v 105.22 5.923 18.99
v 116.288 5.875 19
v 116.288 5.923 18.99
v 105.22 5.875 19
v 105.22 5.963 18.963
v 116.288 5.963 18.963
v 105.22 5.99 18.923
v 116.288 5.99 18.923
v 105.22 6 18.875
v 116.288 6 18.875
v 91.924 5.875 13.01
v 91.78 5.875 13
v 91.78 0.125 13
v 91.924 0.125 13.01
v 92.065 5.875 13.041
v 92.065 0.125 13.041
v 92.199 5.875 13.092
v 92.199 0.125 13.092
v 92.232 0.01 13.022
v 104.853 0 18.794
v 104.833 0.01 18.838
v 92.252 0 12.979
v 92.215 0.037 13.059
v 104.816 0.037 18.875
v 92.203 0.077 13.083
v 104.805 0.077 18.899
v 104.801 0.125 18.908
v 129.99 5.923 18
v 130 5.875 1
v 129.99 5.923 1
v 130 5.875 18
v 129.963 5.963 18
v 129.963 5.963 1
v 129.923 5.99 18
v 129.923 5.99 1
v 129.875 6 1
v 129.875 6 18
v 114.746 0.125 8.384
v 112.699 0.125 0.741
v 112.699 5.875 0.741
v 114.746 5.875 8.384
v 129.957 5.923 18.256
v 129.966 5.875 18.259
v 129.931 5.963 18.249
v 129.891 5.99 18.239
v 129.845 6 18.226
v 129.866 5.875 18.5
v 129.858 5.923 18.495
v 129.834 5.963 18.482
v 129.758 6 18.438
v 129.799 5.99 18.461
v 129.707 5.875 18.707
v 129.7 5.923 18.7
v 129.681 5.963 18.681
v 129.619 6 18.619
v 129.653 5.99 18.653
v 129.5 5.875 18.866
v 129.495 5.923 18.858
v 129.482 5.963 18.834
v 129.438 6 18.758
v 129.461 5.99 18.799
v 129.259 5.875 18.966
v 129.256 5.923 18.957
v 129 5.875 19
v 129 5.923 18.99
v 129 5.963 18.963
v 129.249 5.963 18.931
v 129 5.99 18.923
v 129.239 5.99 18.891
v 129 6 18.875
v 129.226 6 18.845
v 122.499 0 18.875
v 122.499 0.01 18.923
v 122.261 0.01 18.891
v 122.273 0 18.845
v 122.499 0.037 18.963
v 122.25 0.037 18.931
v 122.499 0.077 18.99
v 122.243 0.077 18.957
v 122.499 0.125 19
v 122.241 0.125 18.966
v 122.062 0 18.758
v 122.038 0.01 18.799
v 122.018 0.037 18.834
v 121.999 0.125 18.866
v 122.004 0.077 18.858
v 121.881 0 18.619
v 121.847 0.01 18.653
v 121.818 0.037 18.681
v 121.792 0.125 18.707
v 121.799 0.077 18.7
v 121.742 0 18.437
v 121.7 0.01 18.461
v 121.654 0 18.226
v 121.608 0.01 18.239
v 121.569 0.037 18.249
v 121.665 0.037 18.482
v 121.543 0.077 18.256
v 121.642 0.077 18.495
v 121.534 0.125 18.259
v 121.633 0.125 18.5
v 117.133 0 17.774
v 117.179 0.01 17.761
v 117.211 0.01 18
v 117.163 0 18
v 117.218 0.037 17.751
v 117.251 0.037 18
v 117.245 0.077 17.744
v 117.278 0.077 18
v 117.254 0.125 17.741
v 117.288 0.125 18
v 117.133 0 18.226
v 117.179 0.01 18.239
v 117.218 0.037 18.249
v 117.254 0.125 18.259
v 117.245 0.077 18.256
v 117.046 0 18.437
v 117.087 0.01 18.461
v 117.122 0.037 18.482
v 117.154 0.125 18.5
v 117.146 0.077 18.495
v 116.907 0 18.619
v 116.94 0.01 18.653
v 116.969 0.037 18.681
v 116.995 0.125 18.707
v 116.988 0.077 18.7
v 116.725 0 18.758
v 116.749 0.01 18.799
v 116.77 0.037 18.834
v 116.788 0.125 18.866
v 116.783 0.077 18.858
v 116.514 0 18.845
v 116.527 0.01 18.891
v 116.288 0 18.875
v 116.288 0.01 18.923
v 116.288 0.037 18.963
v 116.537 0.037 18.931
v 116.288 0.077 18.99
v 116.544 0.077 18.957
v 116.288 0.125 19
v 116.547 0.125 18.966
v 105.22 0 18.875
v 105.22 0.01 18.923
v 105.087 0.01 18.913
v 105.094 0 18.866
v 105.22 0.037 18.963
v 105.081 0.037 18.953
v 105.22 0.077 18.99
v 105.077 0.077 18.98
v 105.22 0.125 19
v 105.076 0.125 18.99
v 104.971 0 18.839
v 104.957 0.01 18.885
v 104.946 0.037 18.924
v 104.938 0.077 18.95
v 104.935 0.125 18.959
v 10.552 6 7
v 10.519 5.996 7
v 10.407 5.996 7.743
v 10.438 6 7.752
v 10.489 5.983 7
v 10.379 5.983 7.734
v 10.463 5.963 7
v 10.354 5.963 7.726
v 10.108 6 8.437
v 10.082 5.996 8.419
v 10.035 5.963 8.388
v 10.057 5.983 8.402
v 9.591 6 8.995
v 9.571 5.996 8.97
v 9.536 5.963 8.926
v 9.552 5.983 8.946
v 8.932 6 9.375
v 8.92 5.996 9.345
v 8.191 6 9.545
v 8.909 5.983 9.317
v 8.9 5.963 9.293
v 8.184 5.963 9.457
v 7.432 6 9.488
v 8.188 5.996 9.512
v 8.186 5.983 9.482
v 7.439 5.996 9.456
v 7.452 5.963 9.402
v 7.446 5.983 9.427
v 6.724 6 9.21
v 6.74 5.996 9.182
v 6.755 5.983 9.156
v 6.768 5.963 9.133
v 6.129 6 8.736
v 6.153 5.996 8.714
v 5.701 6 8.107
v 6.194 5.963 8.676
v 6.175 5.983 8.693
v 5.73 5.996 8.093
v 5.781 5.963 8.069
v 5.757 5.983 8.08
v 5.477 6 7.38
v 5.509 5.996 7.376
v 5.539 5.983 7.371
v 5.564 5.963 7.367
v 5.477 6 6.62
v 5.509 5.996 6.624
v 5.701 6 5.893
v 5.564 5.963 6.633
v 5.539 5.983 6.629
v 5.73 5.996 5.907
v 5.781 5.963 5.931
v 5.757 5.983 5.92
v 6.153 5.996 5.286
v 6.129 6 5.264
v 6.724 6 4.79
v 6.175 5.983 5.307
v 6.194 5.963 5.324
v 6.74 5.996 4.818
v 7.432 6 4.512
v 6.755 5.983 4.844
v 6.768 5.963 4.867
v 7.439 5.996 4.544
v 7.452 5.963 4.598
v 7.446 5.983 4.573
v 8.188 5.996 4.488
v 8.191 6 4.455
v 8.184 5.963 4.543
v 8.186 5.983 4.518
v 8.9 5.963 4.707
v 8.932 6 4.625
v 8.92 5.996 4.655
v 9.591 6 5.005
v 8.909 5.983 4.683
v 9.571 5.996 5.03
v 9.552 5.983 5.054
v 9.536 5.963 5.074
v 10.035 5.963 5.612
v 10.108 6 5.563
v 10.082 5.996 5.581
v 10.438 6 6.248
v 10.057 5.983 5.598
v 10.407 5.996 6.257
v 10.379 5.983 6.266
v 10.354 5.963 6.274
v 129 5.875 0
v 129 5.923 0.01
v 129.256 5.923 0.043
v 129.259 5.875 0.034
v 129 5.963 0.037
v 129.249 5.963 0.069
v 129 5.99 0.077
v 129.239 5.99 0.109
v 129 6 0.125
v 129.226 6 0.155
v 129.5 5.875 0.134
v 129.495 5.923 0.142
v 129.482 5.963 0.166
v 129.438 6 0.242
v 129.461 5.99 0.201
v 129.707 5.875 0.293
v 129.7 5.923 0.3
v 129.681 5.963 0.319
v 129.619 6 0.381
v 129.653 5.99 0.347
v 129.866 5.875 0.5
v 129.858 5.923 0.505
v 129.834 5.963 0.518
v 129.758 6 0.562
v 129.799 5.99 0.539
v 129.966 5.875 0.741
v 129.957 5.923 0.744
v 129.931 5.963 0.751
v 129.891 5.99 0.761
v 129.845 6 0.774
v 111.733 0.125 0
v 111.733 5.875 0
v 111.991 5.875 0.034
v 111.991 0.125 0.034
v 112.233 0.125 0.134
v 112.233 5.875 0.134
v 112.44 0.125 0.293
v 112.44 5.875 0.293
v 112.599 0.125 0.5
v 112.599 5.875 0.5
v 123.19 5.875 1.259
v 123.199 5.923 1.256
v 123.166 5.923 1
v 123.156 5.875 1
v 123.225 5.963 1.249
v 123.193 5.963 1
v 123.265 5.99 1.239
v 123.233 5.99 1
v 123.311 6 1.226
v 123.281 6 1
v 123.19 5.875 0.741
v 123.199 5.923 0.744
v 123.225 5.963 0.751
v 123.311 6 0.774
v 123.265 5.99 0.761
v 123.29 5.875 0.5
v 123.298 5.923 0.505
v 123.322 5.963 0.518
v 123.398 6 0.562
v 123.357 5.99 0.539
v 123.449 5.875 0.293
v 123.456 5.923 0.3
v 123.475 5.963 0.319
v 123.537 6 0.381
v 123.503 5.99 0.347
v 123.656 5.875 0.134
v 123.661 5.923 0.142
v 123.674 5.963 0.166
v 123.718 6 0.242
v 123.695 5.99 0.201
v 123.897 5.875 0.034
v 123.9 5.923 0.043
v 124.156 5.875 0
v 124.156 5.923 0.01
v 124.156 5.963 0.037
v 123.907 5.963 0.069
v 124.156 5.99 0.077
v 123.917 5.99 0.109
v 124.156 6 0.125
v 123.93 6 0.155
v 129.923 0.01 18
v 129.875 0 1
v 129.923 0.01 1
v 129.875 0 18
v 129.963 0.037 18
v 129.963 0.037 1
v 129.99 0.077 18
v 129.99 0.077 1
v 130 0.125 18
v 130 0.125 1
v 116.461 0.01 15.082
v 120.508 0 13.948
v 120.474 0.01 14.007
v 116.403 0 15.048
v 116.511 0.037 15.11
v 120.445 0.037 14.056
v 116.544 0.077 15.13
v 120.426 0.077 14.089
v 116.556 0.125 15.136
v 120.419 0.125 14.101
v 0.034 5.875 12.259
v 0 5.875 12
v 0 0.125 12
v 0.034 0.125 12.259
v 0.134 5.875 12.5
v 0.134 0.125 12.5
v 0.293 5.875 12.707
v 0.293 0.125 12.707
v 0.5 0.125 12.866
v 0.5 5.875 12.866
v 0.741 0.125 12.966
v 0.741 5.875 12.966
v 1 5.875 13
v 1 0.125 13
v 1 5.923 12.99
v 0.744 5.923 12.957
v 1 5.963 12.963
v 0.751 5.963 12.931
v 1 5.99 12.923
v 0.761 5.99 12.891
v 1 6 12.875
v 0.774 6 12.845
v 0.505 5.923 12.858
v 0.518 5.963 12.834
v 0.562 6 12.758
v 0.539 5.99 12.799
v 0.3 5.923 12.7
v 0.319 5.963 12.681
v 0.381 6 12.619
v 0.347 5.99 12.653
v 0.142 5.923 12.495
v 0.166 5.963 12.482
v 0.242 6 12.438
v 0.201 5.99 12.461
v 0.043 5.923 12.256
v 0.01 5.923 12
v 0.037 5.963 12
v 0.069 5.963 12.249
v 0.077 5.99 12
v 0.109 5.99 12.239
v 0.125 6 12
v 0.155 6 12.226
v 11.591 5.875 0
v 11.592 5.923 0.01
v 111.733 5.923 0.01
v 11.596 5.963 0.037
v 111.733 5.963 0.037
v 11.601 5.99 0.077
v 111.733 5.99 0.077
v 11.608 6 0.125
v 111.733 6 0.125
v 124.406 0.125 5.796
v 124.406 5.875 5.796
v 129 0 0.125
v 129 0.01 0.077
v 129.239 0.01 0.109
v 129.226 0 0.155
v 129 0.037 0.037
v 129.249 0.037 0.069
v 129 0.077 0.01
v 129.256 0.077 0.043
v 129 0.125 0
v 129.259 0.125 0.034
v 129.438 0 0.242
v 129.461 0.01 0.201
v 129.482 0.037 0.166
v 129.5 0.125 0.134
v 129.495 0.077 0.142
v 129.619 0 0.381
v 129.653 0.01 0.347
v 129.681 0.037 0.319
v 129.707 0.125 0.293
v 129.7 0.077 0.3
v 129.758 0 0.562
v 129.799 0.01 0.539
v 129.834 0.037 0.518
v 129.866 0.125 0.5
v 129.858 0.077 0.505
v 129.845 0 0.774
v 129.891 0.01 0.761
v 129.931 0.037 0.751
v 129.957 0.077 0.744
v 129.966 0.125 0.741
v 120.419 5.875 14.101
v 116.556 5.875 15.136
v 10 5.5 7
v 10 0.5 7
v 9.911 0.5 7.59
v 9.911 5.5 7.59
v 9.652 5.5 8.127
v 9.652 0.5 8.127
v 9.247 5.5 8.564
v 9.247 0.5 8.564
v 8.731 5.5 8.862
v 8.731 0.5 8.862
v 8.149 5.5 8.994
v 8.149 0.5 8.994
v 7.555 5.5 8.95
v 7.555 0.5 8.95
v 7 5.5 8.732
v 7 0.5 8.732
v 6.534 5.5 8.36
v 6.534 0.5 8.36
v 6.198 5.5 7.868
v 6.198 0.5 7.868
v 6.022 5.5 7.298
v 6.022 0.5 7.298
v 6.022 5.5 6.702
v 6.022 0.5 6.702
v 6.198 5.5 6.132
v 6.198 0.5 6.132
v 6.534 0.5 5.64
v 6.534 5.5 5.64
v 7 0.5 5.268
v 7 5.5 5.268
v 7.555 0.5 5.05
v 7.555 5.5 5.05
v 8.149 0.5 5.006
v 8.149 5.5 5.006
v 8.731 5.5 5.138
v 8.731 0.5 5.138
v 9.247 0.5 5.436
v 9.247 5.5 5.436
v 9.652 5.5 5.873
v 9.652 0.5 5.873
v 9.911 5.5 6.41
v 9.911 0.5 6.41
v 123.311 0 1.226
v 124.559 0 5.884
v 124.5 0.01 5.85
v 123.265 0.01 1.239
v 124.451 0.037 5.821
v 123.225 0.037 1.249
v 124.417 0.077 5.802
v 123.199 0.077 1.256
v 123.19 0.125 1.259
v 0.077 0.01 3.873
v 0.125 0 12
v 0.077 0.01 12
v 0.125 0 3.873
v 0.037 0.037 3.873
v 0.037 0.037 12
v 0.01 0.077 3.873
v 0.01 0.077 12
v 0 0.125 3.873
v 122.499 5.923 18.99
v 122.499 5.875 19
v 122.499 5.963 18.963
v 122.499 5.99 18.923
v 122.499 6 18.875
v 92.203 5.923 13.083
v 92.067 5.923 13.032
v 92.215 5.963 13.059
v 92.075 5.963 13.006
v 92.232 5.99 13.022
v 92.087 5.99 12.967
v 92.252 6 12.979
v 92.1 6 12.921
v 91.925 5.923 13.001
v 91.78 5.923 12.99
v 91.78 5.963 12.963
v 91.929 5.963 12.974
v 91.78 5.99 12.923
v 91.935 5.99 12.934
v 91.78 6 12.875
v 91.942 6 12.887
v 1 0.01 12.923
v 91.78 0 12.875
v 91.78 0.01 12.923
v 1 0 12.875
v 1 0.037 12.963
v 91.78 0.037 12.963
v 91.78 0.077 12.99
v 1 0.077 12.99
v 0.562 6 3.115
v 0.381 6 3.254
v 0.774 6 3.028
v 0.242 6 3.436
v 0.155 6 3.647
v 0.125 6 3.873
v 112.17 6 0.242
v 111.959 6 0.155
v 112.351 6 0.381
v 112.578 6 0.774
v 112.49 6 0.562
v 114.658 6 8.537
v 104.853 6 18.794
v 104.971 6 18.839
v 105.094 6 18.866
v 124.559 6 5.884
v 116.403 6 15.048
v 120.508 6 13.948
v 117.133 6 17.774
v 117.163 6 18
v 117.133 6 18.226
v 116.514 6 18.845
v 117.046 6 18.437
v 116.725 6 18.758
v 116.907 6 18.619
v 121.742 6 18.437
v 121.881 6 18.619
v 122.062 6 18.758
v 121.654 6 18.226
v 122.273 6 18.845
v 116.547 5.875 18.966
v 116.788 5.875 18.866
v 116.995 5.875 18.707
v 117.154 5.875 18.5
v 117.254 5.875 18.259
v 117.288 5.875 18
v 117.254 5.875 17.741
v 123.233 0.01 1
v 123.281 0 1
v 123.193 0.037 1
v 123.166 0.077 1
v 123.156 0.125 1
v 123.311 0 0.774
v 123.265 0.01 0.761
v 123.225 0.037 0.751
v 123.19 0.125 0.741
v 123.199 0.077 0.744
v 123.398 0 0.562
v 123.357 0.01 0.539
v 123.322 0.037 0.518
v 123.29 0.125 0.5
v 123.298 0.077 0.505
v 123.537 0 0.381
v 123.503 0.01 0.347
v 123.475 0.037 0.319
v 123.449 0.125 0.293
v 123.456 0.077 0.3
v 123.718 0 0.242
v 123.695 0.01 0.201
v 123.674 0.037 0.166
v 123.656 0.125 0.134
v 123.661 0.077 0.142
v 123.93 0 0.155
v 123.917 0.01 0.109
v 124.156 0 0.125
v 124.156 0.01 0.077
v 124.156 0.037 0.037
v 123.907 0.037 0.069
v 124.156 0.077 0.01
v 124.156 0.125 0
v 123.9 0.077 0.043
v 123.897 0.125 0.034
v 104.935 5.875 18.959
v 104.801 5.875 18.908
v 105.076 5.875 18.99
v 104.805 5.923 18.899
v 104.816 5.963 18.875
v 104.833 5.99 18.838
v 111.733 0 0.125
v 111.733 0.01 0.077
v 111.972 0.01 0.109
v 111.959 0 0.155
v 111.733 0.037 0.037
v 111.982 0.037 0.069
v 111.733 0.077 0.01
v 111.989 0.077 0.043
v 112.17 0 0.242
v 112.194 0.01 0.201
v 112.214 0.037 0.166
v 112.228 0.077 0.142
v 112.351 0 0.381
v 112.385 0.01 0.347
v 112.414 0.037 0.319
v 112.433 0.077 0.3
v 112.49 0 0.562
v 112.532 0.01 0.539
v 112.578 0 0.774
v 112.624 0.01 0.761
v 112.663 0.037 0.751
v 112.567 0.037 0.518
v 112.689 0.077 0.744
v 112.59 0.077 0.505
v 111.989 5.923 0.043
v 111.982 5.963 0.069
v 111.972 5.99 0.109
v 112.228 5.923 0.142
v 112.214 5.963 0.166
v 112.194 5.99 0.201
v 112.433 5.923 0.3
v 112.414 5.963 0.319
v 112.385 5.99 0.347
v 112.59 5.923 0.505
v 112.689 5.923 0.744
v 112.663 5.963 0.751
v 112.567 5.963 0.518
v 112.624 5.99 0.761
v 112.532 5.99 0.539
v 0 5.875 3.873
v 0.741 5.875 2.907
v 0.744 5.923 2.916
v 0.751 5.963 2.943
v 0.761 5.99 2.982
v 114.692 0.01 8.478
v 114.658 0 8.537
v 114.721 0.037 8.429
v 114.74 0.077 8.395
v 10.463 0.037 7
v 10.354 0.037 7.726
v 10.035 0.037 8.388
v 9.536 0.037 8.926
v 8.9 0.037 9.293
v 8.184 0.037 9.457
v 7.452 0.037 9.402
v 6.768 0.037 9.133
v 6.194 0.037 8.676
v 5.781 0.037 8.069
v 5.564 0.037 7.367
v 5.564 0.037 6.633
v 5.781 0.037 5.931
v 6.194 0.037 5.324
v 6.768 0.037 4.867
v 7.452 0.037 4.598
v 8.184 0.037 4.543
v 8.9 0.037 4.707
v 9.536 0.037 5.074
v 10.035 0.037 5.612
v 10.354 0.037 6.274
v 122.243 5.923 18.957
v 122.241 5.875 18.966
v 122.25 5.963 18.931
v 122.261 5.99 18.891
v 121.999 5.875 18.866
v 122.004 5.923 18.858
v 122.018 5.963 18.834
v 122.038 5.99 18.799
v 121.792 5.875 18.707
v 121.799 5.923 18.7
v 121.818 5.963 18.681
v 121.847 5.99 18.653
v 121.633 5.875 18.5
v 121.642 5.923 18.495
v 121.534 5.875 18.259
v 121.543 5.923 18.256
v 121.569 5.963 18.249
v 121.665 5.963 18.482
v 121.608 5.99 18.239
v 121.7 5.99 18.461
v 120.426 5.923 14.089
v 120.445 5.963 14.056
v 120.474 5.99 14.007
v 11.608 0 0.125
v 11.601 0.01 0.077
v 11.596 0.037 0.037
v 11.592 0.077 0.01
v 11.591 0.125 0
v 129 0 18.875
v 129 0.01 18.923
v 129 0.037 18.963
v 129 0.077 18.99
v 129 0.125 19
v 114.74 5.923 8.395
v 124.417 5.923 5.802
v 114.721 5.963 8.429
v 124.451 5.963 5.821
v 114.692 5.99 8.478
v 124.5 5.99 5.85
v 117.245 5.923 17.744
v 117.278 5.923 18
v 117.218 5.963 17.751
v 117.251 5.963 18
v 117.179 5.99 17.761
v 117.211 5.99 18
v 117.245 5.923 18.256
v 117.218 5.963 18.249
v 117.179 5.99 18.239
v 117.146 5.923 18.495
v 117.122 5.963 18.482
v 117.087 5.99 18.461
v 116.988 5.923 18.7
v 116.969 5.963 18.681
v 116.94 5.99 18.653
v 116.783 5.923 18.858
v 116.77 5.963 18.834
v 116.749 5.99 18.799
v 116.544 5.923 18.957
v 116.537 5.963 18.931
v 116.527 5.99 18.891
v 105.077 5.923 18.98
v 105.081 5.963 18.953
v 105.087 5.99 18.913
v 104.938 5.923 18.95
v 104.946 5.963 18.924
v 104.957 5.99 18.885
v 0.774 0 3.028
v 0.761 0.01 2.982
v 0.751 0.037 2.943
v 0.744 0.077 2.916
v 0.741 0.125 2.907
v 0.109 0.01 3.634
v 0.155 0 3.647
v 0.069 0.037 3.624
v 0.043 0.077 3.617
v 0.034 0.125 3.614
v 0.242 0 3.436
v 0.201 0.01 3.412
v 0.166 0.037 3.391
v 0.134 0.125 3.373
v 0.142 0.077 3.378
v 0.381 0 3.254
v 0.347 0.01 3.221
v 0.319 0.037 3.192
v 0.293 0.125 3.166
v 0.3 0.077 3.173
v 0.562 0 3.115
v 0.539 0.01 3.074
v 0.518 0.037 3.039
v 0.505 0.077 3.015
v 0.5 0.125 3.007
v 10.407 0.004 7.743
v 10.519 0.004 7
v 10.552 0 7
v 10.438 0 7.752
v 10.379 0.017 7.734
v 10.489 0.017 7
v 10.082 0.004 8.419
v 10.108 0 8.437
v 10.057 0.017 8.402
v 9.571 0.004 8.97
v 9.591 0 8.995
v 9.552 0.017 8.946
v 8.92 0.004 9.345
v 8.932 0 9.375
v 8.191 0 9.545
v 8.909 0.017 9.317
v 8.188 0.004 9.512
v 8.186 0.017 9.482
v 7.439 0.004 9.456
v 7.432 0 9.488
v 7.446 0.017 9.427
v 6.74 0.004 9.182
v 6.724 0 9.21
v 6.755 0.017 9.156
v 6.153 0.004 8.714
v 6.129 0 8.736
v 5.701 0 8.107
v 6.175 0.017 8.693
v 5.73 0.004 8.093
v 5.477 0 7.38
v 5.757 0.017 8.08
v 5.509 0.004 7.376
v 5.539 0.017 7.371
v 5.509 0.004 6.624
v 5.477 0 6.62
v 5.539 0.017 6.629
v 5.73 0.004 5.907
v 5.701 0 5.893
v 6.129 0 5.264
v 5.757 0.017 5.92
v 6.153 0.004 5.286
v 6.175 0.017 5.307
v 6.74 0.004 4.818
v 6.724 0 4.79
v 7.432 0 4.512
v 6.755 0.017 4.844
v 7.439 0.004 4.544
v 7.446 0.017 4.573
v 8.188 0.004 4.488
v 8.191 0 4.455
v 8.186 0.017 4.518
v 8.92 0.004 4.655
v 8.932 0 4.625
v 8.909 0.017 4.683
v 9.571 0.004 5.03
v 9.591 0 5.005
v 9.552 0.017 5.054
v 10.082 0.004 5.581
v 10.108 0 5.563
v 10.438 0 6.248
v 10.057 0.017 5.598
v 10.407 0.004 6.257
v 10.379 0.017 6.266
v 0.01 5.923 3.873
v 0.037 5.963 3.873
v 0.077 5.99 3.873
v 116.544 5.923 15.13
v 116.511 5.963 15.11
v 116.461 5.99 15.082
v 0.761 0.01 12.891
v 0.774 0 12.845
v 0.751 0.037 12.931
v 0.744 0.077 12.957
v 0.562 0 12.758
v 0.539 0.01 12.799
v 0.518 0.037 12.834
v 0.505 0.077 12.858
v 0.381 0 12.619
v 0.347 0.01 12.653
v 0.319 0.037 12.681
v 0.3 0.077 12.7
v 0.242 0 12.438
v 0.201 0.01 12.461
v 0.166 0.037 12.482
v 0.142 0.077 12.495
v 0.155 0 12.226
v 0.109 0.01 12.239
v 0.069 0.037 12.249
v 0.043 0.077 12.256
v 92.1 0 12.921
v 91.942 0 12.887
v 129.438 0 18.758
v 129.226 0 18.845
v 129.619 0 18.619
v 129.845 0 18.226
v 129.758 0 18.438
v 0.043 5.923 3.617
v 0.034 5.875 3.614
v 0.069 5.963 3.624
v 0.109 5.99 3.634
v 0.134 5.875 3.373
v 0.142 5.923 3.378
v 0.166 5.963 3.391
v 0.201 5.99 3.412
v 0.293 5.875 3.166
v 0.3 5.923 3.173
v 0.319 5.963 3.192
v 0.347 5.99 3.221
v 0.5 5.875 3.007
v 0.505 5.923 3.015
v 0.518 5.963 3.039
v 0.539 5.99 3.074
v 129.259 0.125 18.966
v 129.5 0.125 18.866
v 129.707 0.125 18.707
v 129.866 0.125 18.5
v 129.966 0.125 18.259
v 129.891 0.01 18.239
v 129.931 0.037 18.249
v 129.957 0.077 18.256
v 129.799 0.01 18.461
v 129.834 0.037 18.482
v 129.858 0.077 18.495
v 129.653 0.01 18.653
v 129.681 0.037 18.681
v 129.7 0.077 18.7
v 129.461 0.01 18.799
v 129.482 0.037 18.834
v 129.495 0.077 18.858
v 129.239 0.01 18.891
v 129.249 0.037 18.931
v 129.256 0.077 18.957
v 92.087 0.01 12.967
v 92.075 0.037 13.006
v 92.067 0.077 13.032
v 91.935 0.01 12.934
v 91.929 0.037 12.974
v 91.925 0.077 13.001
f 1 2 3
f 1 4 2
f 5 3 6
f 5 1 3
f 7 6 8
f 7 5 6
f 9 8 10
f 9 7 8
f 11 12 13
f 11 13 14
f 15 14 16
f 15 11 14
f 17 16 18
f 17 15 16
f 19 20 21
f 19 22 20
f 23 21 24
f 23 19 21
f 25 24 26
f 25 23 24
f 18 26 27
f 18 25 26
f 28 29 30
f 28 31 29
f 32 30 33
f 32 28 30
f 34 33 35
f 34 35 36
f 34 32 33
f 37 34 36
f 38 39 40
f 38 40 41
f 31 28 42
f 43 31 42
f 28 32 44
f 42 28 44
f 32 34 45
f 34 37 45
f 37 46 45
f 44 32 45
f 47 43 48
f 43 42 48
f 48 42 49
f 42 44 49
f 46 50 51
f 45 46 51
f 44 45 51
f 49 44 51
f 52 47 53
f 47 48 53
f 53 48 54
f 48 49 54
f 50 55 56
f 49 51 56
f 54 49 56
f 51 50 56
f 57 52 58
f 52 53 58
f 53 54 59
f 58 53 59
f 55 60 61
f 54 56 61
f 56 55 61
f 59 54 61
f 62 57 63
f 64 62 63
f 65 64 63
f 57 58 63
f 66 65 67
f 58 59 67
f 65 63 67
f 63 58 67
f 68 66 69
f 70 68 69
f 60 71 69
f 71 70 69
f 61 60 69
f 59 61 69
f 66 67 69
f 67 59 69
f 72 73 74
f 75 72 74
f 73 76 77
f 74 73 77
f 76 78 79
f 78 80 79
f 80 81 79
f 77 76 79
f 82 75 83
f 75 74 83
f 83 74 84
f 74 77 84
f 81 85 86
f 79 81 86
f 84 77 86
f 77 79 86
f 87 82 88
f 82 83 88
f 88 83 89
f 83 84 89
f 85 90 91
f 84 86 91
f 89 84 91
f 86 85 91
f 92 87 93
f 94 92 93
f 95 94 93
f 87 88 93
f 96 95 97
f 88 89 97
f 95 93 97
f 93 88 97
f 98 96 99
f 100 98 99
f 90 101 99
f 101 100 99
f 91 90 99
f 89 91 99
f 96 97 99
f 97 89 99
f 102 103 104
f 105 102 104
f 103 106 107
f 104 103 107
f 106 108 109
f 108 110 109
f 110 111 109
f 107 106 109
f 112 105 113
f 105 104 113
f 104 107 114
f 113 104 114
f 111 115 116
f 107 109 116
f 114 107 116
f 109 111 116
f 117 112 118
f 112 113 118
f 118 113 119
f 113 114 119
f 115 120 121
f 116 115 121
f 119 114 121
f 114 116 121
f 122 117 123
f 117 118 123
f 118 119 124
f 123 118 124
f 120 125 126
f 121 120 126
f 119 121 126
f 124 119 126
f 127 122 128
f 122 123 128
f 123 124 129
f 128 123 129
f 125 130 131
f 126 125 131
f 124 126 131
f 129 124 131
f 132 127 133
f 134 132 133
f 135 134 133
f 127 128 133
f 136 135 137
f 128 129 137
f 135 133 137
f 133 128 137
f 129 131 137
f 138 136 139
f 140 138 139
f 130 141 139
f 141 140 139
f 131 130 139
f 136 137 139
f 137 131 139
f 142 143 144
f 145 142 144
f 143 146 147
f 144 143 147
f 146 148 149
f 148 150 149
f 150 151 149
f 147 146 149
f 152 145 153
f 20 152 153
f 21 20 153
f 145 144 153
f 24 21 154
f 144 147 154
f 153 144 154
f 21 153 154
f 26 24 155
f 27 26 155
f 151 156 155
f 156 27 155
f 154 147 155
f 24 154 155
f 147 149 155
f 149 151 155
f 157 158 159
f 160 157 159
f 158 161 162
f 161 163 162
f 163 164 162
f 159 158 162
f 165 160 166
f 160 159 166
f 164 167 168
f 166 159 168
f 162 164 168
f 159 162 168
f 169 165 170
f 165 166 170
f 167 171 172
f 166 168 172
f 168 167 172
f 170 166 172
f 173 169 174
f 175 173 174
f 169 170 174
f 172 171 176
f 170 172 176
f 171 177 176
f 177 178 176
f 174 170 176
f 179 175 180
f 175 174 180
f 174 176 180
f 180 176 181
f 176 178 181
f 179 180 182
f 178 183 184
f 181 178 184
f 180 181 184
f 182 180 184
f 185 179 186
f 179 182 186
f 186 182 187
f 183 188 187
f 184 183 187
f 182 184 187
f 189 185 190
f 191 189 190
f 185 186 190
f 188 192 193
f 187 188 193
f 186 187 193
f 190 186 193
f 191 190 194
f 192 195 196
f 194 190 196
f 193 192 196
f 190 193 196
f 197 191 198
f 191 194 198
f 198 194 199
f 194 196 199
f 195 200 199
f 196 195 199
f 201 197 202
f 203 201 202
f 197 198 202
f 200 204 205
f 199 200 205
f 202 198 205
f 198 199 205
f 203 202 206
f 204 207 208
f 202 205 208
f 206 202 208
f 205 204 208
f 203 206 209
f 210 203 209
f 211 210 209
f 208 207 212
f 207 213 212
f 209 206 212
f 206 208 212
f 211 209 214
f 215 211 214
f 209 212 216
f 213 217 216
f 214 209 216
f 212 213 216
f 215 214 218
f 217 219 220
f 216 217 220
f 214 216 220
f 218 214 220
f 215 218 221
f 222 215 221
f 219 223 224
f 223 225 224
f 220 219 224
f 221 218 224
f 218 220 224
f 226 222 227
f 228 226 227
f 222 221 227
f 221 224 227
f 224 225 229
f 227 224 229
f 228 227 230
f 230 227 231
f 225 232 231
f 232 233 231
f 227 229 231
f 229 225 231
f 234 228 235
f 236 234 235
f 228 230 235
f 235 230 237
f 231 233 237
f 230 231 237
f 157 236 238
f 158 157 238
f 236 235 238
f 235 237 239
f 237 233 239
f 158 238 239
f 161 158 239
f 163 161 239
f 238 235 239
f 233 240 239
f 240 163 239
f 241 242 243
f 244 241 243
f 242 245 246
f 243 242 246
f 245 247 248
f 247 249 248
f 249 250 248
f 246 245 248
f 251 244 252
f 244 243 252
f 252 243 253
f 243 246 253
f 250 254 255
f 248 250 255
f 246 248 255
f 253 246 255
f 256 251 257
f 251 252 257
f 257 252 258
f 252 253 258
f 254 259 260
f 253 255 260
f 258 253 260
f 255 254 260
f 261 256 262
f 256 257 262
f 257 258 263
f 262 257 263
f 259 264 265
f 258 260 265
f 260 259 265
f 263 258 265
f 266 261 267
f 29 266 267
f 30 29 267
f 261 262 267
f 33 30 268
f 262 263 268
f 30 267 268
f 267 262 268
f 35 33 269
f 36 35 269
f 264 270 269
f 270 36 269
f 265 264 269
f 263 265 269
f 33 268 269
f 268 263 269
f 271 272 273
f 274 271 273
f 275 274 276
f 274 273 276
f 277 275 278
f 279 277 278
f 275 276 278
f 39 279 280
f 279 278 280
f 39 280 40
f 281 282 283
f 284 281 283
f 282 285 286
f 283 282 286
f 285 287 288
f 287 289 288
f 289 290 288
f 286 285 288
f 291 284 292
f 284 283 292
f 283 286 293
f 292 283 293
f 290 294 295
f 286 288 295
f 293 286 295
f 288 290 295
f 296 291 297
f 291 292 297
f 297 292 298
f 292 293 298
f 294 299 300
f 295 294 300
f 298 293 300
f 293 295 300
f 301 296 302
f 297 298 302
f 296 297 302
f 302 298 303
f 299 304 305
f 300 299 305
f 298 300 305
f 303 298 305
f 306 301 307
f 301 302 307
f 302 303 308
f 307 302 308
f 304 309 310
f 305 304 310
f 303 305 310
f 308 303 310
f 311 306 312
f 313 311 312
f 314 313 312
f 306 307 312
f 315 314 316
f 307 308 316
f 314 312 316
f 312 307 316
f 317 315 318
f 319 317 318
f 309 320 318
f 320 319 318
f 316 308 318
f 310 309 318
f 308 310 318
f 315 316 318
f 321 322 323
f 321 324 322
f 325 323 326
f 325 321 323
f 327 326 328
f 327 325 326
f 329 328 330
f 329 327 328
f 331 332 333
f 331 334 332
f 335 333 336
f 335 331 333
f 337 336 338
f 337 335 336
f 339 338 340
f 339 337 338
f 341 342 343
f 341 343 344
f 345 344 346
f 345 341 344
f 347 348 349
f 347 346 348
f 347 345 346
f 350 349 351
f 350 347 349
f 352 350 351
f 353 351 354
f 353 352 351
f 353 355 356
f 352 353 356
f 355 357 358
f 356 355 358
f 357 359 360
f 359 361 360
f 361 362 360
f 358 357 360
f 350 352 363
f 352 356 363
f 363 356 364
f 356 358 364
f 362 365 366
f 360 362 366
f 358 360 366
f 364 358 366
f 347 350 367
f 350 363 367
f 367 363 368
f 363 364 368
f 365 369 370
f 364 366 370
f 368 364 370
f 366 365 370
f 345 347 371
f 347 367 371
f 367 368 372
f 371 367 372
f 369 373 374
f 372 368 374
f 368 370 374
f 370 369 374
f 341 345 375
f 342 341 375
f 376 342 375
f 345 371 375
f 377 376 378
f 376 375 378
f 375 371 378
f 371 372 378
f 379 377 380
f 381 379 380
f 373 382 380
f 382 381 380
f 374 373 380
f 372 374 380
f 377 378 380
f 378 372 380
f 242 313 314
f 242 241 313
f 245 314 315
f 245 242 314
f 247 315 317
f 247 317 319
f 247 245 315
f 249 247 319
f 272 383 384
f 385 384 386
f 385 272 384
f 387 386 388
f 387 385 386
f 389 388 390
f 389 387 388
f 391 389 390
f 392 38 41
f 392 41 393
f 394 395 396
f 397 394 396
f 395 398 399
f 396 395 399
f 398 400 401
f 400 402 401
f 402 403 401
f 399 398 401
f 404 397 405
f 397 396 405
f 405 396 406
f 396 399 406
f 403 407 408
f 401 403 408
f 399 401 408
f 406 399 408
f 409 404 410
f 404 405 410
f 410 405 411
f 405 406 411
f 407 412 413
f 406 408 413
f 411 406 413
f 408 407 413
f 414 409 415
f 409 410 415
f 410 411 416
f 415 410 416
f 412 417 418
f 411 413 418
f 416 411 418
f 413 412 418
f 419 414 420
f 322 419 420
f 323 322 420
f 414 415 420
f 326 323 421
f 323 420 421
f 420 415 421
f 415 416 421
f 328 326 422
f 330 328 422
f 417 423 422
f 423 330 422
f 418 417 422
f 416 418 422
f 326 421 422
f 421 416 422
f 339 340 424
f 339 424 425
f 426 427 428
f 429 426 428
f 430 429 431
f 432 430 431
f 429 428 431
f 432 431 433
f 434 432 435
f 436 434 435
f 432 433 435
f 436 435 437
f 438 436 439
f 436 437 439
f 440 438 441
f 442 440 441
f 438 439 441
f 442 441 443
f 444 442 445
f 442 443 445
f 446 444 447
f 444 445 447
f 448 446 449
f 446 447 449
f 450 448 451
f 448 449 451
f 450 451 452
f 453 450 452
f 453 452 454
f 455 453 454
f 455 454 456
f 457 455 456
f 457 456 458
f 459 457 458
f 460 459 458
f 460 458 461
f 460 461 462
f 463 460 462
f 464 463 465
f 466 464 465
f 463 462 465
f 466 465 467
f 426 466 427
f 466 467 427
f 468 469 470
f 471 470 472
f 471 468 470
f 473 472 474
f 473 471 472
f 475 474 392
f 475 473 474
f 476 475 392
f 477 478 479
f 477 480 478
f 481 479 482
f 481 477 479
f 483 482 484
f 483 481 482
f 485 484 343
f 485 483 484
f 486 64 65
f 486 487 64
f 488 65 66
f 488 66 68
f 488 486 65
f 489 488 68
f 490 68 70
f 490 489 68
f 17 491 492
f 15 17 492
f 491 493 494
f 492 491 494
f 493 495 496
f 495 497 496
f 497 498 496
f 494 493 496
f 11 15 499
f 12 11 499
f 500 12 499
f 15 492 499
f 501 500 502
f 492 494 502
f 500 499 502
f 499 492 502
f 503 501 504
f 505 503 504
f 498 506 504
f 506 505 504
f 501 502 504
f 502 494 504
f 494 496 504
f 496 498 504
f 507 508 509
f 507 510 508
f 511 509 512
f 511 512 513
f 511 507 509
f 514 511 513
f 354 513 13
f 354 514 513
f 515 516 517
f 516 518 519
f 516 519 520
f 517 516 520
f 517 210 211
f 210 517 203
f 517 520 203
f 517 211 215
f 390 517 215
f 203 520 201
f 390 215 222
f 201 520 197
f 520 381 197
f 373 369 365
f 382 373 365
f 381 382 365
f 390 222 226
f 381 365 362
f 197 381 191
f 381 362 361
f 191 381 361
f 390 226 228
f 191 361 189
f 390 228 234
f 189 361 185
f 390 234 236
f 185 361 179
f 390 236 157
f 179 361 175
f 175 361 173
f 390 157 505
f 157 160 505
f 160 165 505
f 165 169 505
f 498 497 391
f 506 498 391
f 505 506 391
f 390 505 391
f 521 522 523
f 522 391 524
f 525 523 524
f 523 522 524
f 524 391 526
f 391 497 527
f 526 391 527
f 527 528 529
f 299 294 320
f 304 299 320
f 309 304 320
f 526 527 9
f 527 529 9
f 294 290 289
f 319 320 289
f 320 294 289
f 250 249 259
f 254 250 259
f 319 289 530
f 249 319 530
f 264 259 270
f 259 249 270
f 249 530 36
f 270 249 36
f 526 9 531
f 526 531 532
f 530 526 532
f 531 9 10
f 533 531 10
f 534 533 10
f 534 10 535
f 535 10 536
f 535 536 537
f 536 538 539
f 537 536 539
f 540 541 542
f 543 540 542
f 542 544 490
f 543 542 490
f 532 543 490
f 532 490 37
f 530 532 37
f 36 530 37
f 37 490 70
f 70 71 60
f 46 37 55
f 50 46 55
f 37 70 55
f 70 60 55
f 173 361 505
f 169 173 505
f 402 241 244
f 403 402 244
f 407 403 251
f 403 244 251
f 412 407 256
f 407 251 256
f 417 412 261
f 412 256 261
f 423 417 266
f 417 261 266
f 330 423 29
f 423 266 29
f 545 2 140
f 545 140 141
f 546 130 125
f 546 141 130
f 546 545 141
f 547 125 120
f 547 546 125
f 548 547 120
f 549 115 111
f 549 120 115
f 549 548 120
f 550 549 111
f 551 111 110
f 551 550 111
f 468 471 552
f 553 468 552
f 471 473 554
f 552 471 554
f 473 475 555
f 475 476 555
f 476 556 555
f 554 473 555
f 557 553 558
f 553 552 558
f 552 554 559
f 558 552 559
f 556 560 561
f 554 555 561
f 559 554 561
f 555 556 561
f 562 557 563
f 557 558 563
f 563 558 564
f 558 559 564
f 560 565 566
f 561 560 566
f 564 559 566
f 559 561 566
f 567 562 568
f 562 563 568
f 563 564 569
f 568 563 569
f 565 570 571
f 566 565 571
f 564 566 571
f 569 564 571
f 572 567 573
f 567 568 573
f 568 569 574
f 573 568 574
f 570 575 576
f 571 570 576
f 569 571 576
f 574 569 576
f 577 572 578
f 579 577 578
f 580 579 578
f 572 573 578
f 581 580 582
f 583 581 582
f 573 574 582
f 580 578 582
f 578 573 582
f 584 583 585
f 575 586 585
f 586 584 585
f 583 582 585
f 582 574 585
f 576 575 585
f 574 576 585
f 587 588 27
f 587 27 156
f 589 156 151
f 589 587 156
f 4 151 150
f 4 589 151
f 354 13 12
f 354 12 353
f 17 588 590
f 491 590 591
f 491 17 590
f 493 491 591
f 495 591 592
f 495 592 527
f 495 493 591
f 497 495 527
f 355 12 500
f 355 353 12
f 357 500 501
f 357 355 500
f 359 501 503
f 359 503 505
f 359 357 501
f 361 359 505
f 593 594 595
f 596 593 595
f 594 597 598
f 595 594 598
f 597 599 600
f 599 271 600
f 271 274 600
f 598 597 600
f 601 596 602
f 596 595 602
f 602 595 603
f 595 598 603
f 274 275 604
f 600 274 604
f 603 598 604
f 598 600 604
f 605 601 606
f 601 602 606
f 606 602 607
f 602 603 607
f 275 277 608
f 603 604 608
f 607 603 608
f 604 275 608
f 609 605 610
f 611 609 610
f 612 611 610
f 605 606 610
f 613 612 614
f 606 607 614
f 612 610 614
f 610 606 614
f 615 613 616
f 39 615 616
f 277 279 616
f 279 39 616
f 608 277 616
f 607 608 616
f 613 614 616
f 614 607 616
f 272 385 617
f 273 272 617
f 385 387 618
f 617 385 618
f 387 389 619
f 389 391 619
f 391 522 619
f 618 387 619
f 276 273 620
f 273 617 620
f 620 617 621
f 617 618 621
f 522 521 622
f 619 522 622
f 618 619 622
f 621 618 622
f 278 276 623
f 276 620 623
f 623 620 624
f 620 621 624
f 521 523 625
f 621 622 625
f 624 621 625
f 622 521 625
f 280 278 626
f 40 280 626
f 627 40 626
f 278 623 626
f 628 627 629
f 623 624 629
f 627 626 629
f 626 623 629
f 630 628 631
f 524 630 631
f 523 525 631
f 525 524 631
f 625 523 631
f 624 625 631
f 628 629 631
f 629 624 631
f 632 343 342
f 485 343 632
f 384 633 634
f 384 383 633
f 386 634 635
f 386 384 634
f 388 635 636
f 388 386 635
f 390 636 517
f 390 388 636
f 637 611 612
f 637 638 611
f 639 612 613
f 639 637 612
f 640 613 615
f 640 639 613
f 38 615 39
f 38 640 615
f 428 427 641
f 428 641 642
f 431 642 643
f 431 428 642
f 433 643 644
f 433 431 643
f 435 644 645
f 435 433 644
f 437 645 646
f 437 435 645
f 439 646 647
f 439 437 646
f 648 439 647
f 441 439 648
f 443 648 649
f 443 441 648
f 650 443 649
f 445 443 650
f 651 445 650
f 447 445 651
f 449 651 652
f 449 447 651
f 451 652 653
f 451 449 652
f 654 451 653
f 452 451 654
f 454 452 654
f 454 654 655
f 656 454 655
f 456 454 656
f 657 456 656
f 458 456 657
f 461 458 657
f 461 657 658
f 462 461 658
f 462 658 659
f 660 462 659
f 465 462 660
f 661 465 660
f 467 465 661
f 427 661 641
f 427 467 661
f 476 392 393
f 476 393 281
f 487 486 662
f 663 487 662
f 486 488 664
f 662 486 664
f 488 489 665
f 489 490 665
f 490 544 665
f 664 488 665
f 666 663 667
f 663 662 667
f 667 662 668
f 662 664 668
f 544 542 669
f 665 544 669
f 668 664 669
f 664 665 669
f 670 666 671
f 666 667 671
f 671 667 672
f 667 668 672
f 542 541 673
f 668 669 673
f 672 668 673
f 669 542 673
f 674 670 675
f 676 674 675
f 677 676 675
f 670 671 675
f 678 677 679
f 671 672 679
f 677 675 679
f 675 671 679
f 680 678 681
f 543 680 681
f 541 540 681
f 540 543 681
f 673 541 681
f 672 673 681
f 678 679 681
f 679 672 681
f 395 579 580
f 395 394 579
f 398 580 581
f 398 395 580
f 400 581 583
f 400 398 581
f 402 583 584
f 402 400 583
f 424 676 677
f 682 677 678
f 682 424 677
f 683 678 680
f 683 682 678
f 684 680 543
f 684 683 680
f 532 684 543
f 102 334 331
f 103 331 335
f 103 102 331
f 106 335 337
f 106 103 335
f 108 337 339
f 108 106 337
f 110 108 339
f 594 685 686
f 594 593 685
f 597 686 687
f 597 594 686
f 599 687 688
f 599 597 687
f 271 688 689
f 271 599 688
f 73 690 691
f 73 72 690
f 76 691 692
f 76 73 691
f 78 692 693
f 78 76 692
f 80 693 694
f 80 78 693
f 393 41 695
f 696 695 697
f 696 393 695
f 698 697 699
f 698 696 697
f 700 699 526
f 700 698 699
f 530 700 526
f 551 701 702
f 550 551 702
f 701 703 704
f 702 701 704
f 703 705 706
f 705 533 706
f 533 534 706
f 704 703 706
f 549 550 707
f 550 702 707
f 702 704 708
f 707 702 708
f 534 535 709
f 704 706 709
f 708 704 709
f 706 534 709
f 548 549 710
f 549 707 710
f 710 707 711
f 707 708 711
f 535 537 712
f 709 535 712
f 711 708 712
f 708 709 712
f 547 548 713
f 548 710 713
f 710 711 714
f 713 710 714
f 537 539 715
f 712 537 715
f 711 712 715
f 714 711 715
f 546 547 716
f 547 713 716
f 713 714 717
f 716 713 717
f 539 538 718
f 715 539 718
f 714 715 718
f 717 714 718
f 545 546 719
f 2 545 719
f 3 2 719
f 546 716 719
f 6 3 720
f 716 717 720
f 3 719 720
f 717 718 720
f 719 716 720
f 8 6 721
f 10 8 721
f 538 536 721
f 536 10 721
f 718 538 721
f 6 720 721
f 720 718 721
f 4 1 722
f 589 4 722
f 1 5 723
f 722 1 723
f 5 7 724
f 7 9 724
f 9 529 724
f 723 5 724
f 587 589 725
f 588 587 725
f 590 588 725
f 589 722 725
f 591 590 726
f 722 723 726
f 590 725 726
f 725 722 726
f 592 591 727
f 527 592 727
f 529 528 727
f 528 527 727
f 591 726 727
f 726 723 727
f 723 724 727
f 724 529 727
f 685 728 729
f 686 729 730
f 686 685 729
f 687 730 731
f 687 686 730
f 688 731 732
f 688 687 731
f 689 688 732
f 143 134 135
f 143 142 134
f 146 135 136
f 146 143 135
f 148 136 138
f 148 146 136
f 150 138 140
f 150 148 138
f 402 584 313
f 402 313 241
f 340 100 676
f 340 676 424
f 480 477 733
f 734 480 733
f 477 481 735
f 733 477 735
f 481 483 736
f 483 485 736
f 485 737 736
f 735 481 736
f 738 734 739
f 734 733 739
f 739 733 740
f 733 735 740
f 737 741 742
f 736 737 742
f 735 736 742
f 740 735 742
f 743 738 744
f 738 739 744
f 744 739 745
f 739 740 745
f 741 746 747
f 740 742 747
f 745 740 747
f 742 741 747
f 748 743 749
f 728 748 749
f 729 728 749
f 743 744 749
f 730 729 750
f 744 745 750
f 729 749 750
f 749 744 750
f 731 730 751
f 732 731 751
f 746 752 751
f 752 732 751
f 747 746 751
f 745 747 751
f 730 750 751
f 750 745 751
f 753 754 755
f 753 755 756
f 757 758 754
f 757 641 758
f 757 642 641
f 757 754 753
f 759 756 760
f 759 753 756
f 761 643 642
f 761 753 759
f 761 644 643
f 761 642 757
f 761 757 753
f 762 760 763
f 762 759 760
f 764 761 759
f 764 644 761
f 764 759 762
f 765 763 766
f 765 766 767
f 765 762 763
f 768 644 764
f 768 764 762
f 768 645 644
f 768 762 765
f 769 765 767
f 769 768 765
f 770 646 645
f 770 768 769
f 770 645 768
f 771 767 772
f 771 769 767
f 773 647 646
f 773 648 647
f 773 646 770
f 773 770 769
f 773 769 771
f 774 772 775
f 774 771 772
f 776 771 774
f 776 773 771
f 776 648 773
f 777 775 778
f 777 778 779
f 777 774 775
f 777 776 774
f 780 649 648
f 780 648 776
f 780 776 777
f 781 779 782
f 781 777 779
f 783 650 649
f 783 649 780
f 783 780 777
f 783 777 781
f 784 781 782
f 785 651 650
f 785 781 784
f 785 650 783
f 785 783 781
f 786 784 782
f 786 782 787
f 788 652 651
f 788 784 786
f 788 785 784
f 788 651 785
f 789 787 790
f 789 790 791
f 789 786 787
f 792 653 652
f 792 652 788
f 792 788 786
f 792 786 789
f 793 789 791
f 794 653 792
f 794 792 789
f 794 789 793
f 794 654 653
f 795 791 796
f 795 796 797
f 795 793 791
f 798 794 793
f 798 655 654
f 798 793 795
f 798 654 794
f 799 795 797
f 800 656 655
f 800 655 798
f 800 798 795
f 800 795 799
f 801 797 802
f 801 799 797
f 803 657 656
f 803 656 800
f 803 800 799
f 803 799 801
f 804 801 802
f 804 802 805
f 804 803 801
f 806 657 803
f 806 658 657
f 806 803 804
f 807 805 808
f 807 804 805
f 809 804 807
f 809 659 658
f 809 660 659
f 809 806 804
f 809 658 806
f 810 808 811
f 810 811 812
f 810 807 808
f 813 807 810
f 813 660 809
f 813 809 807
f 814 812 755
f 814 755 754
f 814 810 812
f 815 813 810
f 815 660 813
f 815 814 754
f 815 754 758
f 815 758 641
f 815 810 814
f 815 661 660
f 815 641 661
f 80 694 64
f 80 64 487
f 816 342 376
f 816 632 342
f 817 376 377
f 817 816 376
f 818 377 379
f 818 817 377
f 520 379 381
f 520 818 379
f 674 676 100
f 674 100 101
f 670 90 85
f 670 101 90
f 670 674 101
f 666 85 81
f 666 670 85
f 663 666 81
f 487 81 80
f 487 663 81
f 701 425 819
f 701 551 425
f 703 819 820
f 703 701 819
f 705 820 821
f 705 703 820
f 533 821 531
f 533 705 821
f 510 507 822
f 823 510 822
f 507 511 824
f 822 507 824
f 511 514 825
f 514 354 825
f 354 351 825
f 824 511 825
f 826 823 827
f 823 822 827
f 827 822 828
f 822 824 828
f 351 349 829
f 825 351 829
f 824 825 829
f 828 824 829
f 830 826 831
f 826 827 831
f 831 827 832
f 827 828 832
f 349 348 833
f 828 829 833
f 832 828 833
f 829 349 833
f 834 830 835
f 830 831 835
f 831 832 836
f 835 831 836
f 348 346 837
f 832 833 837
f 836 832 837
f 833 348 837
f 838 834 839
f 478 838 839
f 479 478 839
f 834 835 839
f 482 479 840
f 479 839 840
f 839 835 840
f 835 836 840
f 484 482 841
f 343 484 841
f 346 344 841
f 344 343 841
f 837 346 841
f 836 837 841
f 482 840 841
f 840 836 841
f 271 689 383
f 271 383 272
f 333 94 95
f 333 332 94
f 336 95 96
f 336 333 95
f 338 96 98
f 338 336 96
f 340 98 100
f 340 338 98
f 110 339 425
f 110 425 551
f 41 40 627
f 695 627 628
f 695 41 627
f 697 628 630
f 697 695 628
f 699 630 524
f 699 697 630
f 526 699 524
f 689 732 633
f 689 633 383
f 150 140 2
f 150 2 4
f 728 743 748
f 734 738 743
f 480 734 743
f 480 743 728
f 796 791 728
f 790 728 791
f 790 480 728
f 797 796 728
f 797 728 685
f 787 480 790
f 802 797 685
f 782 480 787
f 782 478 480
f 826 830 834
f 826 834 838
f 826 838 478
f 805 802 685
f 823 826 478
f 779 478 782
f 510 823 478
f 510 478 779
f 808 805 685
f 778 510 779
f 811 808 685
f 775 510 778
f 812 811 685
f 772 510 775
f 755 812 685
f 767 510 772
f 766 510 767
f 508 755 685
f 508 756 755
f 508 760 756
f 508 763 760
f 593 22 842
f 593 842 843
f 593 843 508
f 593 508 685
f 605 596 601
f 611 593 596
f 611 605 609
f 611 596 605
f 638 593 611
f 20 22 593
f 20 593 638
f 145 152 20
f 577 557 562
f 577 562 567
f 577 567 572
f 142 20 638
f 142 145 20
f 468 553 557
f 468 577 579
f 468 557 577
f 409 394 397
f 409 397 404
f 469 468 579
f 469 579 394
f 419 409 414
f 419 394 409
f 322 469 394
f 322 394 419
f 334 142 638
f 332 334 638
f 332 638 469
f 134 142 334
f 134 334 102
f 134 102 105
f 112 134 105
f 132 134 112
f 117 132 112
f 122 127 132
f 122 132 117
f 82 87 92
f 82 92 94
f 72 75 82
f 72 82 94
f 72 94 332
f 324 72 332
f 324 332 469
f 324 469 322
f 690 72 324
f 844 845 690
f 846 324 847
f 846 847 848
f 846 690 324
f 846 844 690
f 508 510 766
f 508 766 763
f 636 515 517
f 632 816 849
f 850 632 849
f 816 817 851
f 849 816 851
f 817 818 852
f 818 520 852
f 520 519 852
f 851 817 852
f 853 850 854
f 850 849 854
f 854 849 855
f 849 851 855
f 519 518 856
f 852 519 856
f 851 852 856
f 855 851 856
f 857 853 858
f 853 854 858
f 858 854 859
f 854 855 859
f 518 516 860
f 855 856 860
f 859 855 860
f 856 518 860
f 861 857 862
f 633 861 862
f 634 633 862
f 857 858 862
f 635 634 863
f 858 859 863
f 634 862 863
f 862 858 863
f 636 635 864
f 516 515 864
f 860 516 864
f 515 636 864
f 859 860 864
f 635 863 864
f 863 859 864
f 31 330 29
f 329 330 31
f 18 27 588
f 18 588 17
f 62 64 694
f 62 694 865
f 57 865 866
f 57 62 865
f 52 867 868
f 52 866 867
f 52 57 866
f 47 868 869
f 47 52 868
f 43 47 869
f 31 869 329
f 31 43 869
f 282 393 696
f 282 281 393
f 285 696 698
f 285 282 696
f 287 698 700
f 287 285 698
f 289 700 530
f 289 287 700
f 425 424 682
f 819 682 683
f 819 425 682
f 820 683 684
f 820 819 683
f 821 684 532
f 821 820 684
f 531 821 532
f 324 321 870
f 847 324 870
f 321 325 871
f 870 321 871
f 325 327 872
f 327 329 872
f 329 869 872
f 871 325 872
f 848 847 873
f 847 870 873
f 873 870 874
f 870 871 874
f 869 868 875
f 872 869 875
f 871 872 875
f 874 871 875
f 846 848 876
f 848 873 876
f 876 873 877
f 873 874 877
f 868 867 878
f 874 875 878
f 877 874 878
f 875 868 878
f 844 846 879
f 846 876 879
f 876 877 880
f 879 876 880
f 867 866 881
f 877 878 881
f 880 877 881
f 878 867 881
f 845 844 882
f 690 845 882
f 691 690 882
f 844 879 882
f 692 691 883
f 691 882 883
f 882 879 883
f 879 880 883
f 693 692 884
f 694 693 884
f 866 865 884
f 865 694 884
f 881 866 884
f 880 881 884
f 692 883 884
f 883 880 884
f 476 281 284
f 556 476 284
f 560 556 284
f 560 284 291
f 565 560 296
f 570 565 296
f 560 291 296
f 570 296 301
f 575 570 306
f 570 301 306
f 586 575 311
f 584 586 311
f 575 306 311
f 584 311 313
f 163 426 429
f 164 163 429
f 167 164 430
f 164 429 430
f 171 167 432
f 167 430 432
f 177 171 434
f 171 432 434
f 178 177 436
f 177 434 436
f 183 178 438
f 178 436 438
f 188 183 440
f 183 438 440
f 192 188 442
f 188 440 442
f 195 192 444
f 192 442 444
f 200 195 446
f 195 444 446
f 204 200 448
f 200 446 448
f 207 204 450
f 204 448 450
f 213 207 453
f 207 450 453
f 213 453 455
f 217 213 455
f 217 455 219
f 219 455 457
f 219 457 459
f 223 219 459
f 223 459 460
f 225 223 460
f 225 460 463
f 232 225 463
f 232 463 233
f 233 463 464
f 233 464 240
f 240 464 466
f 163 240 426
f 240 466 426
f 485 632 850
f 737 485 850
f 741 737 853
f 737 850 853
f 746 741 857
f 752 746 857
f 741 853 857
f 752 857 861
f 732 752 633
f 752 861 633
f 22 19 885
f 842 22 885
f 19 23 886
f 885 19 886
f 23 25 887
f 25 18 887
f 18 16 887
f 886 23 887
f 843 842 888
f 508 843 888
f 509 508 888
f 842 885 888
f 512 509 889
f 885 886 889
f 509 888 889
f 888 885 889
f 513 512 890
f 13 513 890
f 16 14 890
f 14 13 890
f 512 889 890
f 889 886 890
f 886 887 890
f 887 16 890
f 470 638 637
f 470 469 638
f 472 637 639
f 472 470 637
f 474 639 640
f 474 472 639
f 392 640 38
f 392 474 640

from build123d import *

# Parameters (mm, degrees)
F0_R     = 2
F1_DEPTH = 6
F2_R     = 1
F3_SIZE  = 0.5
F4_R     = 0.125


with BuildPart() as f1:
    # F0 (on Front) → F1 (new body)
    with BuildSketch(Plane.XZ):
        Polygon((0, 13), (0, 3.105829), (11.59111, 0), (112.5, 0), (114.746418, 8.383745), (124.405676, 5.795555), (122.852762, 0), (130, 0), (130, 19), (121.732139, 19), (120.419462, 14.101021), (116.555758, 15.136297), (117.591035, 19), (105, 19), (92, 13), align=None)
        with Locations((8, 7)):
            Circle(F0_R, mode=Mode.SUBTRACT)
    extrude(amount=-F1_DEPTH)

    # F2
    f2_edges = [f1.edges().sort_by_distance(p)[0] for p in [
        (130, 3, 19),
        (130, 3, 0),
        (0, 3, 13),
        (92, 3, 13),
        (105, 3, 19),
        (121.732139, 3, 19),
        (122.852762, 3, 0),
        (117.591035, 3, 19),
        (112.5, 3, 0),
        (0, 3, 3.105829),
    ]]
    fillet(f2_edges, radius=F2_R)

    # F3
    f3_edges = [f1.edges().sort_by_distance(p)[0] for p in [
        (6, 6, 7),
        (6, 0, 7),
    ]]
    chamfer(f3_edges, length=F3_SIZE)

    # F4
    f4_edges = [f1.edges().sort_by_distance(p)[0] for p in [
        (5.5, 0, 7),
        (125.749733, 0, 19),
        (129.707107, 0, 18.707107),
        (121.890705, 0, 18.793353),
        (130, 0, 9.5),
        (120.976501, 0, 16.17992),
        (129.707107, 0, 0.292893),
        (118.48761, 0, 14.618659),
        (126.577994, 0, 0),
        (116.904747, 0, 16.438739),
        (123.362634, 0, 0.391239),
        (117.081163, 0, 18.608761),
        (123.797869, 0, 3.527187),
        (110.753723, 0, 19),
        (119.576047, 0, 7.08965),
        (105.005113, 0, 18.976719),
        (113.722508, 0, 4.562463),
        (98.5, 0, 16),
        (112.341434, 0, 0.206647),
        (91.994887, 0, 13.023281),
        (61.661891, 0, 0),
        (46.390182, 0, 13),
        (6.166145, 0, 1.453615),
        (0.292893, 0, 12.707107),
        (0.206647, 0, 3.264394),
        (0, 0, 7.936578),
        (5.5, 6, 7),
        (125.749733, 6, 19),
        (129.707107, 6, 18.707107),
        (121.890705, 6, 18.793353),
        (130, 6, 9.5),
        (120.976501, 6, 16.17992),
        (129.707107, 6, 0.292893),
        (118.48761, 6, 14.618659),
        (126.577994, 6, 0),
        (116.904747, 6, 16.438739),
        (123.362634, 6, 0.391239),
        (117.081163, 6, 18.608761),
        (123.797869, 6, 3.527187),
        (110.753723, 6, 19),
        (119.576047, 6, 7.08965),
        (105.005113, 6, 18.976719),
        (113.722508, 6, 4.562463),
        (98.5, 6, 16),
        (112.341434, 6, 0.206647),
        (91.994887, 6, 13.023281),
        (61.661891, 6, 0),
        (46.390182, 6, 13),
        (6.166145, 6, 1.453615),
        (0.292893, 6, 12.707107),
        (0.206647, 6, 3.264394),
        (0, 6, 7.936578),
    ]]
    fillet(f4_edges, radius=F4_R)


solid = f1.part
